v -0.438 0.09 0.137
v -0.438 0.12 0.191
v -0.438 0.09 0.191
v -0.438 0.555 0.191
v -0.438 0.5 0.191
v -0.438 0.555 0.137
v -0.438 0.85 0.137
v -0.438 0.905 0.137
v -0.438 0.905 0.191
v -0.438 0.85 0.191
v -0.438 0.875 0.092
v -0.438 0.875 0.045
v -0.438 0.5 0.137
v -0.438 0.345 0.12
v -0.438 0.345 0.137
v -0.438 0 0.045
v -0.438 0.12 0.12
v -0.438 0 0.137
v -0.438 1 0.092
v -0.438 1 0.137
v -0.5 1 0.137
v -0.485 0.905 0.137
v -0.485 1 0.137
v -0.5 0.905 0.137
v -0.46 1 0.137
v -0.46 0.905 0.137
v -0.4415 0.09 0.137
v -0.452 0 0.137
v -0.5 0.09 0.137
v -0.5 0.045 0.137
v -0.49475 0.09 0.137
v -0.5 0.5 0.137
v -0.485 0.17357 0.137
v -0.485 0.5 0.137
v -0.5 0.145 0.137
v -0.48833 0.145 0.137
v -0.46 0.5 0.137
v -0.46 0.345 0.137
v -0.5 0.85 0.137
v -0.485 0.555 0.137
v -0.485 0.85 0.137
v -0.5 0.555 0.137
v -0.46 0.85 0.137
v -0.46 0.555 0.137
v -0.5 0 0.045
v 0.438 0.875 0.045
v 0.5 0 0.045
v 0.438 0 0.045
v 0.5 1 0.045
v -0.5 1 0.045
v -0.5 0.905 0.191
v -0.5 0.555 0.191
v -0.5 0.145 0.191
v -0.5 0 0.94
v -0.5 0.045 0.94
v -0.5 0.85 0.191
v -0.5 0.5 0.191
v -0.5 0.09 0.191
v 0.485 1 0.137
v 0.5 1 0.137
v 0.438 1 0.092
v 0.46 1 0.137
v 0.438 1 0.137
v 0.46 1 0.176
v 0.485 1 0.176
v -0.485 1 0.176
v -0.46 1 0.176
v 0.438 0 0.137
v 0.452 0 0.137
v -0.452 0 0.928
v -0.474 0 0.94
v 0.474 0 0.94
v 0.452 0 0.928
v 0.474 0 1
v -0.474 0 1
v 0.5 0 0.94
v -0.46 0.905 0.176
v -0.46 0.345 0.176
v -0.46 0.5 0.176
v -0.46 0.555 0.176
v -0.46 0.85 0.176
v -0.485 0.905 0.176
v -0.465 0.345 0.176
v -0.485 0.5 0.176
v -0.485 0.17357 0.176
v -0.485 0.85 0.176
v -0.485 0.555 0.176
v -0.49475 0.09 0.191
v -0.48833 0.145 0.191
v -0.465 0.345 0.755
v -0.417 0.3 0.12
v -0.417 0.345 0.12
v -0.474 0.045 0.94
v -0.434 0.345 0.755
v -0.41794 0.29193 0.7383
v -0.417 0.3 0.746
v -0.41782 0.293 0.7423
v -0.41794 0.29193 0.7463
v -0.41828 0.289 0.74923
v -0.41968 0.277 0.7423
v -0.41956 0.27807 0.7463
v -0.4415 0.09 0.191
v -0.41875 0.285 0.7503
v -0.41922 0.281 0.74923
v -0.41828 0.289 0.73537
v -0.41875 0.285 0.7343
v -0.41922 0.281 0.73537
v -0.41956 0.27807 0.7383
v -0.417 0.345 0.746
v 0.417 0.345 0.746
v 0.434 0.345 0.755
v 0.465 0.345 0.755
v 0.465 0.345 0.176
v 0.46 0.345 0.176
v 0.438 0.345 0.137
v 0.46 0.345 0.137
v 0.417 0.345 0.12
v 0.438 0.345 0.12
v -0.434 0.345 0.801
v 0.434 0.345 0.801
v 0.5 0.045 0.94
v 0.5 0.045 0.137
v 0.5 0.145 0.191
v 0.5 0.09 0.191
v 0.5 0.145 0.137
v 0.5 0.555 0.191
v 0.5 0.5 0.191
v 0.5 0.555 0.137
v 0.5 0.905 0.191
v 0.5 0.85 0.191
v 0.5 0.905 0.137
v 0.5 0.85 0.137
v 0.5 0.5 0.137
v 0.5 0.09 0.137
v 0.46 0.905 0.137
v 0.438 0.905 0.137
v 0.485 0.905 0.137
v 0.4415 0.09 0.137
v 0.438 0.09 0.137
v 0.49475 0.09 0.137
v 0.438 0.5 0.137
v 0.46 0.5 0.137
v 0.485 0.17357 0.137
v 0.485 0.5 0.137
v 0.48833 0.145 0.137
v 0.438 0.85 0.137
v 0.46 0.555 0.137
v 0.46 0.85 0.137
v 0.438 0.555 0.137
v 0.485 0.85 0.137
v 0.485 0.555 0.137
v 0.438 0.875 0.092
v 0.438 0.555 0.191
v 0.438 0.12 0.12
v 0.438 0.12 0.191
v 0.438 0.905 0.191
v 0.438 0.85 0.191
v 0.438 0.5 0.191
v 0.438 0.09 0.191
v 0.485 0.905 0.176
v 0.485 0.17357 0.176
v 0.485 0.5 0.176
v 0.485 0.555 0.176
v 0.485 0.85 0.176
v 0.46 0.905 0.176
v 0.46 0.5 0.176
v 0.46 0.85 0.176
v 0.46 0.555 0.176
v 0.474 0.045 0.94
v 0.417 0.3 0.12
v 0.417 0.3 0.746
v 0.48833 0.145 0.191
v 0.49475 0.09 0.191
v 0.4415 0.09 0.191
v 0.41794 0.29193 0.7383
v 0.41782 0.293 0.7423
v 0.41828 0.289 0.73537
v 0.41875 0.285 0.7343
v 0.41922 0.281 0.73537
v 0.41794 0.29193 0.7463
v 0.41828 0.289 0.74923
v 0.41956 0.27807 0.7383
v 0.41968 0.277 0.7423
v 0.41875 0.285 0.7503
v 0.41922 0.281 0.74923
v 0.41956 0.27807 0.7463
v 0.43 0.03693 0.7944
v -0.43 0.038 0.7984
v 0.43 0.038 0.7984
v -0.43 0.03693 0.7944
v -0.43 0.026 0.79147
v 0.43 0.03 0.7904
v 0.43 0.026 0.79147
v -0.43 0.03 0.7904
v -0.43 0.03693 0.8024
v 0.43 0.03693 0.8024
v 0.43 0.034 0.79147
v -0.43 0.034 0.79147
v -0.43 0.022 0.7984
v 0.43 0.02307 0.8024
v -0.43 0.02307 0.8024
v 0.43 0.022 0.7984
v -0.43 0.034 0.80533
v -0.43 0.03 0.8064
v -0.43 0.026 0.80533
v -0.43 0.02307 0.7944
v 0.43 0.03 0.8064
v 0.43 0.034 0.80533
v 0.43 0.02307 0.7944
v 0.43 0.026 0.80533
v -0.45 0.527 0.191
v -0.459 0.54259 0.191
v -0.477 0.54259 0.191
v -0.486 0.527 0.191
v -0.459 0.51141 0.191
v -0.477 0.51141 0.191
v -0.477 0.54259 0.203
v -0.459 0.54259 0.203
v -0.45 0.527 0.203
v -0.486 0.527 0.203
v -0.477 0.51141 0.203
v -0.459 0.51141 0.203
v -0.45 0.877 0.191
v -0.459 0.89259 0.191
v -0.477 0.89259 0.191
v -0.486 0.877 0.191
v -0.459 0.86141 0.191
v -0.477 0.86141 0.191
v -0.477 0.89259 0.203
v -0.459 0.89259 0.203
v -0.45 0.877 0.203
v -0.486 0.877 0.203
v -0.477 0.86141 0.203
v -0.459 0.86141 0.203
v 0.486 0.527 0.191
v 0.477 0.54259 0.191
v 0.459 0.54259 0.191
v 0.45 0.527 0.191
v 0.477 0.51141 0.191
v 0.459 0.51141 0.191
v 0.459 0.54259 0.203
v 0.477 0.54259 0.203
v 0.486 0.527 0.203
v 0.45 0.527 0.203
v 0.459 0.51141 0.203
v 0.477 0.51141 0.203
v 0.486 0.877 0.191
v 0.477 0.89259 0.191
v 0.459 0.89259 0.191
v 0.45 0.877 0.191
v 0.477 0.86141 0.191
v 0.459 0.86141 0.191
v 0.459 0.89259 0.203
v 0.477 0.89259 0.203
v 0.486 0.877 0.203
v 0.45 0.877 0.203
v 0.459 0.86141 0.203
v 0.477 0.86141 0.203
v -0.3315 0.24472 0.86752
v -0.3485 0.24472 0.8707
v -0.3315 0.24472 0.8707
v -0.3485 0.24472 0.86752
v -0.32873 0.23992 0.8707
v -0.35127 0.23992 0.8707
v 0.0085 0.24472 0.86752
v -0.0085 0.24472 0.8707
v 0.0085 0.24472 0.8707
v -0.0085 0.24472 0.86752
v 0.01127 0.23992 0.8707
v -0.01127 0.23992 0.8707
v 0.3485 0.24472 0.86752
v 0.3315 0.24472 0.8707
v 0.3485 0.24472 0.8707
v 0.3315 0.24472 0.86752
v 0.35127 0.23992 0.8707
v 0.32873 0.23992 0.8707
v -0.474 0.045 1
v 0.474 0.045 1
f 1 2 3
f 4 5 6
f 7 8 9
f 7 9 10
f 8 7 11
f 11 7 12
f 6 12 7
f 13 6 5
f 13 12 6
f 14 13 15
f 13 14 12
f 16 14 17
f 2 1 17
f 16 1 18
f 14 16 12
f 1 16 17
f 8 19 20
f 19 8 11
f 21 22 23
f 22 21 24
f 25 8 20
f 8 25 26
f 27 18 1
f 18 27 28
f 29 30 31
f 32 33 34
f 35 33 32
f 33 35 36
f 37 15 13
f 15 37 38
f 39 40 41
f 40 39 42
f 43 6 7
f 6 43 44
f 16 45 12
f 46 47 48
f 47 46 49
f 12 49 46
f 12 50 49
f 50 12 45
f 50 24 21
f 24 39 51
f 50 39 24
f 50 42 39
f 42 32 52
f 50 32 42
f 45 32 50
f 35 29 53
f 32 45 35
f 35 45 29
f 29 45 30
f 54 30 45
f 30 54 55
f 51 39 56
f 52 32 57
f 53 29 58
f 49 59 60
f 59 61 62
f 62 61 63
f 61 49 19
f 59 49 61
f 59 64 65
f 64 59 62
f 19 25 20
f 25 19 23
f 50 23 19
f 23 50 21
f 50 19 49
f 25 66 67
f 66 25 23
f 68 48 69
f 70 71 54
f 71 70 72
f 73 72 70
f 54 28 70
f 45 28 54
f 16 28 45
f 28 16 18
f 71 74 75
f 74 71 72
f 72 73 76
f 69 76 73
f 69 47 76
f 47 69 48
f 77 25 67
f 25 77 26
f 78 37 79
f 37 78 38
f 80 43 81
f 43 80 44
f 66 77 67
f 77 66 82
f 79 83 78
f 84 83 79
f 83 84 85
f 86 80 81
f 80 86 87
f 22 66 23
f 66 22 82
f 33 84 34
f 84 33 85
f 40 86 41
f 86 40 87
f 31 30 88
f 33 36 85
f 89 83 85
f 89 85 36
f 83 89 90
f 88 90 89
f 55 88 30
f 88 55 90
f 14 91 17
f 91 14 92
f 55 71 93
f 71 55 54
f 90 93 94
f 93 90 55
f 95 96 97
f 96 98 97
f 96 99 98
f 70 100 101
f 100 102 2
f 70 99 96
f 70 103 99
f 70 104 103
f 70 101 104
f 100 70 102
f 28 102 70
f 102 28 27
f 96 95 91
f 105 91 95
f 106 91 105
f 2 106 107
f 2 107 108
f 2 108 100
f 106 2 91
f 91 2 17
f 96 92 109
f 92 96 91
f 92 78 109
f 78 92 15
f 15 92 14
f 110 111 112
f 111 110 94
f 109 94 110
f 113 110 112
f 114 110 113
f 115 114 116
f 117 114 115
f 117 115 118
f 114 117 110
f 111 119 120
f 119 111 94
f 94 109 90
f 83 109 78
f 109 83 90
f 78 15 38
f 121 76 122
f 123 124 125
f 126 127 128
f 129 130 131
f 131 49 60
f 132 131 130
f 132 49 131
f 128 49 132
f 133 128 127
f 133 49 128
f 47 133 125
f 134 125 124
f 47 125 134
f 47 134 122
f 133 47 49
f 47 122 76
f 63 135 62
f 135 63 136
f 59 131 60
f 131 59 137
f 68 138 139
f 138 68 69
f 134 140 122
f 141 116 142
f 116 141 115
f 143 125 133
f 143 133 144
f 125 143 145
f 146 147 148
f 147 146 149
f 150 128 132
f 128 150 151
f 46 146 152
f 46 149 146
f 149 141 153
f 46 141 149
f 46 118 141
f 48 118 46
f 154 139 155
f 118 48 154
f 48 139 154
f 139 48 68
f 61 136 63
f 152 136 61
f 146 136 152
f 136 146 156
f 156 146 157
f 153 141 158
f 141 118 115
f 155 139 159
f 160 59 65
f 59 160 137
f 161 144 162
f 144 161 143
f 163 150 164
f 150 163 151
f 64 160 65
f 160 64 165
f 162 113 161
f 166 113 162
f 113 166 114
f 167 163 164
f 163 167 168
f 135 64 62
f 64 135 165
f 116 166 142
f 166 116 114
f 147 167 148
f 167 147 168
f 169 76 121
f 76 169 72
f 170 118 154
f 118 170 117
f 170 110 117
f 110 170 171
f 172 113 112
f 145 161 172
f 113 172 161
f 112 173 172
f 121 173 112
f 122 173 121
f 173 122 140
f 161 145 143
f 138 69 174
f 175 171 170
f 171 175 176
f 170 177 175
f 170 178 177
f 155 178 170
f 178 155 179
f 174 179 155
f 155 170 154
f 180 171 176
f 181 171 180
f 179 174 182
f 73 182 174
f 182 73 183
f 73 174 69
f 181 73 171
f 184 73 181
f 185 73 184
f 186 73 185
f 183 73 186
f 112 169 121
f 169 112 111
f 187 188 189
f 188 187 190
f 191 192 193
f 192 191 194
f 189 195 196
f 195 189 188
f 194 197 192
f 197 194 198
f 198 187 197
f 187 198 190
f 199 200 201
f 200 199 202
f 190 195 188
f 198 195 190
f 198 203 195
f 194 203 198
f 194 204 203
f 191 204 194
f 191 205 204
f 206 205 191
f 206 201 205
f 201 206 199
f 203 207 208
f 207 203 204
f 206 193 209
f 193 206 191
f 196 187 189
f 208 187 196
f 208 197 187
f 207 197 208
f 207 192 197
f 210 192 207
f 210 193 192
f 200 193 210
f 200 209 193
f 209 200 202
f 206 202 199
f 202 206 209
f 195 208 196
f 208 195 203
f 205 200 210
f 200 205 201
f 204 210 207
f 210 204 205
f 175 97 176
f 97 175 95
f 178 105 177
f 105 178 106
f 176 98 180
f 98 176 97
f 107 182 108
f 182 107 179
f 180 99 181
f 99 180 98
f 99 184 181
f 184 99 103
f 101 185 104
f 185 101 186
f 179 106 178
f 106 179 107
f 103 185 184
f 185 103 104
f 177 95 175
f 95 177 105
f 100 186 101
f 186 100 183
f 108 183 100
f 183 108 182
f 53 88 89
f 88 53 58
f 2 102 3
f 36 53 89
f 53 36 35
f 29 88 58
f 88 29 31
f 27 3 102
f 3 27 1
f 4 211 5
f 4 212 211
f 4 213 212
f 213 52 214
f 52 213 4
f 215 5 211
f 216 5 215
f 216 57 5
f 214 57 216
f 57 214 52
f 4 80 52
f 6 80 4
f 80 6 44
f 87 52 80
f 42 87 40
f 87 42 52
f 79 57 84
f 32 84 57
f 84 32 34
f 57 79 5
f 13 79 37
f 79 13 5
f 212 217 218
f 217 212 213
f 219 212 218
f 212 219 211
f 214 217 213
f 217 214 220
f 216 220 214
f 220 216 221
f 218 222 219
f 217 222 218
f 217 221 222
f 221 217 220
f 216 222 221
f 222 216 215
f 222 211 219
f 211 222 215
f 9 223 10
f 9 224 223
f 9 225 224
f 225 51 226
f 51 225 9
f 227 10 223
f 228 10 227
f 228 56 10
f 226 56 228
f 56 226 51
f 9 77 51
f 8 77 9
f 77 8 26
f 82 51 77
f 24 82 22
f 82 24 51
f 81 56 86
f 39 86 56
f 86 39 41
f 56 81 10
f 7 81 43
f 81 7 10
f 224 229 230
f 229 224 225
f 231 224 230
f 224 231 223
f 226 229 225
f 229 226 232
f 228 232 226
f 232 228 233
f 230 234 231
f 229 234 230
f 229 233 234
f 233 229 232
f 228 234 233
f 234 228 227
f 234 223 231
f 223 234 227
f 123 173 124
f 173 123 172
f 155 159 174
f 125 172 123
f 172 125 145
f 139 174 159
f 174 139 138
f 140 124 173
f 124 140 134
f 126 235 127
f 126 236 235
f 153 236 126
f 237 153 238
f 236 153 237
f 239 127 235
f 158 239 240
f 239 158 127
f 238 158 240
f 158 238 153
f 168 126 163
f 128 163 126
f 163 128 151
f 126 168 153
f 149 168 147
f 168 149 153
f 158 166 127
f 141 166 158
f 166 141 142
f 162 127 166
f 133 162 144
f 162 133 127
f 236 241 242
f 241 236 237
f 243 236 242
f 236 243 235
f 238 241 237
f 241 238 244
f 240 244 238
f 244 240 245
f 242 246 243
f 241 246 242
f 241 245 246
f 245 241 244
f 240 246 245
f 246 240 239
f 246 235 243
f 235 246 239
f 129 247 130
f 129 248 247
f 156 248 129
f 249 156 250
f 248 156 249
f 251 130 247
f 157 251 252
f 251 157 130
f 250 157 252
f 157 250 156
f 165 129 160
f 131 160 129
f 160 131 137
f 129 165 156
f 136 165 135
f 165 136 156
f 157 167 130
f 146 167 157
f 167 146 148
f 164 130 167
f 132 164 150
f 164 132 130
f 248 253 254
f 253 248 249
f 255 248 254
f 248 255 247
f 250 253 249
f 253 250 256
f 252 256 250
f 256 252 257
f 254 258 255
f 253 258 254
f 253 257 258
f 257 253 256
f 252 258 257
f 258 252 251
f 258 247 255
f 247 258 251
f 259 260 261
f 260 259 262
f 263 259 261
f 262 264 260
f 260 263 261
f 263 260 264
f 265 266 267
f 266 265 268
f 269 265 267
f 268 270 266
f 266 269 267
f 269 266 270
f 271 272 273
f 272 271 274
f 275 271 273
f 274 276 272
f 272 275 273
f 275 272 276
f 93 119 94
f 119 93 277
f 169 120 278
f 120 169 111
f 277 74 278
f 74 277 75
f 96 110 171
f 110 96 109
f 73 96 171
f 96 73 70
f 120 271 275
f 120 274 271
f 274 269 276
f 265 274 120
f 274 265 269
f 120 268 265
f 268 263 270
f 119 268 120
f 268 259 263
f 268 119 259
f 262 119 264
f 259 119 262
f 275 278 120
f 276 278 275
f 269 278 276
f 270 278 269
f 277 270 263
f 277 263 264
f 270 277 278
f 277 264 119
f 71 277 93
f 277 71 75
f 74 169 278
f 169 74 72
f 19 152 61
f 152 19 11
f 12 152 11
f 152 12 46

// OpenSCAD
// EPP casing, approval asset only. NOT embedded in the DLL.
// Normalised frame: x +/-0.5 (width), y 0..1 (motor rear -> gearbox rear), z 0..1.
// Future code can interpolate engine/gearbox end widths and heights using y.
// Render coordinates are OpenSCAD x=side, y=longitudinal, z=up.
lod=0;
module casing_raw() {
 // Two continuous folded lower rails and the seam saddle, with chamfered outside faces.
 for(s=[-1,1]) {
  translate([s<0?-500:438,0,45]) cube([62,1000,92]);
  translate([s<0?-485:460,0,130]) cube([25,1000,46]);
  // Upper shoulders tie the motor rear into the transmission case.
  hull() {
   translate([s<0?-500:452,0,120]) cube([48,45,820]);
   translate([s<0?-465:417,300,120]) cube([48,45,635]);
  }
 }
 // Crown over the seam, with a bevel into the smaller gearbox. Open below for the machinery.
 hull() {
  translate([-474,0,928]) cube([948,45,72]);
  translate([-434,300,746]) cube([868,45,55]);
 }
 // Broad mounting crossmember joins both rails; no floating decorative pieces.
 translate([-455,875,45]) cube([910,125,47]);
 if(lod==0) {
  // Raised seams, six service cover fasteners and side rail bolt pads.
  for(y=[30,285]) translate([-430,y,805-y*.22]) rotate([0,90,0]) cylinder(r=8,h=860,$fn=12);
  for(s=[-1,1])for(y=[90,500,850]) {
   translate([s<0?-500:438,y,116]) cube([62,55,75]);
   translate([s*468,y+27,185]) cylinder(r=18,h=18,$fn=6);
  }
  for(x=[-340,0,340])for(y=[70,230])
   translate([x,y,972-y*.51]) cylinder(r=17,h=16,$fn=6);
 }
}
module casing() {scale([.001,.001,.001]) casing_raw();}
casing();
